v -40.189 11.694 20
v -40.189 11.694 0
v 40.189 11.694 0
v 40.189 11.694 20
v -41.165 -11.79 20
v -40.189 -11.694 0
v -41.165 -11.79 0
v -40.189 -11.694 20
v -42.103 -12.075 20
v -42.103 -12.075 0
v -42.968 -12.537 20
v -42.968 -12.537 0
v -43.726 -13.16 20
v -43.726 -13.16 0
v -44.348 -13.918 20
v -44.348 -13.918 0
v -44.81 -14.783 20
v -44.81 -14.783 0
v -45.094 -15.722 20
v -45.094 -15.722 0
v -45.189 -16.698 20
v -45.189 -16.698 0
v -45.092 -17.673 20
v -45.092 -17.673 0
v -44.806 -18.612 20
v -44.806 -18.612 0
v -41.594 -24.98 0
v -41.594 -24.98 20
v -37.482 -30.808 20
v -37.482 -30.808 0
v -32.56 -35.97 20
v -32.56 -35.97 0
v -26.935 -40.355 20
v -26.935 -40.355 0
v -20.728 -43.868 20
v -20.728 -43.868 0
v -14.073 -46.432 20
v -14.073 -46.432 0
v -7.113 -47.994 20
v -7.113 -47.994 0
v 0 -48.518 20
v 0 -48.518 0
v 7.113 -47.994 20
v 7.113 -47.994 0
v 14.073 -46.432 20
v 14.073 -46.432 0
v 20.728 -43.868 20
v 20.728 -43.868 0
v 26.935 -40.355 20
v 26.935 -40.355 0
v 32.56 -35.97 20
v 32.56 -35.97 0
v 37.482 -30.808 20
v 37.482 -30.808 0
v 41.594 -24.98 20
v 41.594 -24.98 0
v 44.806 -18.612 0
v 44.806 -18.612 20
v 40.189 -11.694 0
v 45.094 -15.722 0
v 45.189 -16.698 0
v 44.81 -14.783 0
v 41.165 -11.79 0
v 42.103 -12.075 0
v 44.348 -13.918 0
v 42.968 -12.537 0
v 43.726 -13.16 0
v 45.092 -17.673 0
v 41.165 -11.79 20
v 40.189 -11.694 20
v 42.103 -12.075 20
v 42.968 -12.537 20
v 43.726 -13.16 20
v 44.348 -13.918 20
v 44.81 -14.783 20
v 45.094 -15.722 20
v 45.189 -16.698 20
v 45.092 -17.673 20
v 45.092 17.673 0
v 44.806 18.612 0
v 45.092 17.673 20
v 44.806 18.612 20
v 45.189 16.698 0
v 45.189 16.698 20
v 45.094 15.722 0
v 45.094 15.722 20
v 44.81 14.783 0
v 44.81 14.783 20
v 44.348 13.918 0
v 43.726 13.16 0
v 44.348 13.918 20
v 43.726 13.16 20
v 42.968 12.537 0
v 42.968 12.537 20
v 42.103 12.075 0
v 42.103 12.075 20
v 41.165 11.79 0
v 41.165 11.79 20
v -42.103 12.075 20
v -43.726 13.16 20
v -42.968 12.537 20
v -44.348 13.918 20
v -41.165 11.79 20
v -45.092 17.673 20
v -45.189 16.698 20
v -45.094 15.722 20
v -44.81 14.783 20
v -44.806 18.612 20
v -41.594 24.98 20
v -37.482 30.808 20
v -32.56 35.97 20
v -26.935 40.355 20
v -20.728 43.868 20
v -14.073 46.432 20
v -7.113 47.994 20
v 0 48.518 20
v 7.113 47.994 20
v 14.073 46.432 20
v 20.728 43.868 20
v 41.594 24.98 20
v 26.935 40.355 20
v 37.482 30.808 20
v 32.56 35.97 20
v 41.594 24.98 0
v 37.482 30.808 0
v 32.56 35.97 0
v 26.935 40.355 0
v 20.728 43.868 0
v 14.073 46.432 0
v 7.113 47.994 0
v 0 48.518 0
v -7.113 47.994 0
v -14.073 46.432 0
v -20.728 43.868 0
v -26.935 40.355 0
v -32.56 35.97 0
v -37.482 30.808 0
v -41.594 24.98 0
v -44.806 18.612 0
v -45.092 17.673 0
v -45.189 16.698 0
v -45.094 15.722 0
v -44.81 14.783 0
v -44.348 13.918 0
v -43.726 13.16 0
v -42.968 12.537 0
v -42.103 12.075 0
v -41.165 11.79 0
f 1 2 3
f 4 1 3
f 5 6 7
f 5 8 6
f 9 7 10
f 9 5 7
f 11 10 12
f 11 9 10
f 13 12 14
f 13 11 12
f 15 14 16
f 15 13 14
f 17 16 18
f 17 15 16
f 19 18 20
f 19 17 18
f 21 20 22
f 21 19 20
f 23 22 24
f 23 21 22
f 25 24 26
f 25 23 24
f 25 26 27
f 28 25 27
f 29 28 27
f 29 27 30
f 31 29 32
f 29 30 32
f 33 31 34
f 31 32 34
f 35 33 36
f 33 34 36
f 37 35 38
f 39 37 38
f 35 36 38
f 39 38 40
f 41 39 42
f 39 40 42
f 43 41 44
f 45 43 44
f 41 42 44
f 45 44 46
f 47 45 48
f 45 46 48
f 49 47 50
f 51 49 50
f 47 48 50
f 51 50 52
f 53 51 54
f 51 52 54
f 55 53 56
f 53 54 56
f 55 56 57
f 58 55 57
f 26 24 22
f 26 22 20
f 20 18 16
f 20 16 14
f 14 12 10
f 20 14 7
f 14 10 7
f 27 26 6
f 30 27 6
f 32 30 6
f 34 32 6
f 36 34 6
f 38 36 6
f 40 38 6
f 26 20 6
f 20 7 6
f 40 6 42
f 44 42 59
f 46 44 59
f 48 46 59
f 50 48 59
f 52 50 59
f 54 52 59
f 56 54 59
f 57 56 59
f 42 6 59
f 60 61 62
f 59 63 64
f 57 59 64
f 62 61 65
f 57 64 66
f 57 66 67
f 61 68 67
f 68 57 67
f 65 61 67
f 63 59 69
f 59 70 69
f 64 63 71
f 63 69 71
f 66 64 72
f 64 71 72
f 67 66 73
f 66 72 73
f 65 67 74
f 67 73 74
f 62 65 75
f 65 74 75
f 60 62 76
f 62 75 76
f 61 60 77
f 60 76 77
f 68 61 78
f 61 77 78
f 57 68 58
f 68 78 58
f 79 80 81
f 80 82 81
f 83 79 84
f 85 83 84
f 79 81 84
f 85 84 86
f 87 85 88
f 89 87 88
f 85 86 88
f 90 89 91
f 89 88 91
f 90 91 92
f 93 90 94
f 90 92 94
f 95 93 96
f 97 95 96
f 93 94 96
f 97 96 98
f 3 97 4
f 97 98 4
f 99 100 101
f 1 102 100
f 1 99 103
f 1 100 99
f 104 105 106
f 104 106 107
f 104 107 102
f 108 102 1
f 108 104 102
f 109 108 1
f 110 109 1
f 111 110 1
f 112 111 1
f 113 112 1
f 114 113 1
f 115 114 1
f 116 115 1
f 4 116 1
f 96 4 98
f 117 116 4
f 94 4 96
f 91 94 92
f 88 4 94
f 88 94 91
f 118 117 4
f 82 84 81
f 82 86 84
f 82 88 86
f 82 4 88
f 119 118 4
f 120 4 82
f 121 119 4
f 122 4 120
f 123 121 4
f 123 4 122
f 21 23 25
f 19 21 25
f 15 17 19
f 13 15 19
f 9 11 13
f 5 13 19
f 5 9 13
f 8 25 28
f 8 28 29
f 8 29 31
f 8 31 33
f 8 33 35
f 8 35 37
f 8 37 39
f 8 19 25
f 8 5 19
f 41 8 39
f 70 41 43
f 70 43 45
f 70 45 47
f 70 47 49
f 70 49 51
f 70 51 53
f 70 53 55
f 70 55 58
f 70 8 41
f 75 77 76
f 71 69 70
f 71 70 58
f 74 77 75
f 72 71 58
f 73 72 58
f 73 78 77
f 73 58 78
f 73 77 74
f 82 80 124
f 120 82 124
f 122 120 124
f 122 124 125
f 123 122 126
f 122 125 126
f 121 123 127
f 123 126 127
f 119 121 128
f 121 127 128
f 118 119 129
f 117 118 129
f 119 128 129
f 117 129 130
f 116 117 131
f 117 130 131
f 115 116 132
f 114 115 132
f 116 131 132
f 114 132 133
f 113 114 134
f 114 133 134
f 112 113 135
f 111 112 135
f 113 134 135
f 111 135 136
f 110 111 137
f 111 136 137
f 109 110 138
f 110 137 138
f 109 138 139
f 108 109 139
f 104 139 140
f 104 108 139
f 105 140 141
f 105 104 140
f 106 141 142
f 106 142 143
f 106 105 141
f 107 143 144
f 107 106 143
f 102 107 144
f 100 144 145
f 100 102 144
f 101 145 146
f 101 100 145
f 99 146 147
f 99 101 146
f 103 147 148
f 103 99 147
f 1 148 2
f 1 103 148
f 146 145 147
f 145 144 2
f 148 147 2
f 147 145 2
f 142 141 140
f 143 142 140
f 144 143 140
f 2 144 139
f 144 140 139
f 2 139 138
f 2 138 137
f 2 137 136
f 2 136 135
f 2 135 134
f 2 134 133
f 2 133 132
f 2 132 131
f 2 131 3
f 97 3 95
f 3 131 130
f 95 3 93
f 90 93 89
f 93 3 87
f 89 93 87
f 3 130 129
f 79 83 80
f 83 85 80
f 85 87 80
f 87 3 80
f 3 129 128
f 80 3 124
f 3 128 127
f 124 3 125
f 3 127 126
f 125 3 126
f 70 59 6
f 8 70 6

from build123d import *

# Parameters (mm, degrees)
F1_DEPTH = 20
F2_R     = 5
F2_2_R   = 5


with BuildPart() as f1:
    # F0 (on Top) → F1 (new body)
    with BuildSketch(Plane.XY):
        with BuildLine():
            Line((47.0879210033, -11.6936424747), (-47.0879210033, -11.6936424747))
            ThreePointArc((-47.0879210033, -11.6936424747), (0, -48.5181778176), (47.0879210033, -11.6936424747))
        make_face()
    extrude(amount=F1_DEPTH)

    # F2
    f2_edges = [f1.edges().sort_by_distance(p)[0] for p in [
        (-47.087921, -11.693642, 10),
        (47.087921, -11.693642, 10),
    ]]
    fillet(f2_edges, radius=F2_R)


with BuildPart() as f1b:
    # F0 (on Top) → F1, piece 2 (new body)
    with BuildSketch(Plane.XY):
        with BuildLine():
            ThreePointArc((47.0879210033, 11.6936424747), (0, 48.5181778176), (-47.0879210033, 11.6936424747))
            Line((-47.0879210033, 11.6936424747), (47.0879210033, 11.6936424747))
        make_face()
    extrude(amount=F1_DEPTH)

    # F2#2
    f2_2_edges = [f1b.edges().sort_by_distance(p)[0] for p in [
        (-47.087921, 11.693642, 10),
        (47.087921, 11.693642, 10),
    ]]
    fillet(f2_2_edges, radius=F2_2_R)


solid = Compound([f1.part, f1b.part])
